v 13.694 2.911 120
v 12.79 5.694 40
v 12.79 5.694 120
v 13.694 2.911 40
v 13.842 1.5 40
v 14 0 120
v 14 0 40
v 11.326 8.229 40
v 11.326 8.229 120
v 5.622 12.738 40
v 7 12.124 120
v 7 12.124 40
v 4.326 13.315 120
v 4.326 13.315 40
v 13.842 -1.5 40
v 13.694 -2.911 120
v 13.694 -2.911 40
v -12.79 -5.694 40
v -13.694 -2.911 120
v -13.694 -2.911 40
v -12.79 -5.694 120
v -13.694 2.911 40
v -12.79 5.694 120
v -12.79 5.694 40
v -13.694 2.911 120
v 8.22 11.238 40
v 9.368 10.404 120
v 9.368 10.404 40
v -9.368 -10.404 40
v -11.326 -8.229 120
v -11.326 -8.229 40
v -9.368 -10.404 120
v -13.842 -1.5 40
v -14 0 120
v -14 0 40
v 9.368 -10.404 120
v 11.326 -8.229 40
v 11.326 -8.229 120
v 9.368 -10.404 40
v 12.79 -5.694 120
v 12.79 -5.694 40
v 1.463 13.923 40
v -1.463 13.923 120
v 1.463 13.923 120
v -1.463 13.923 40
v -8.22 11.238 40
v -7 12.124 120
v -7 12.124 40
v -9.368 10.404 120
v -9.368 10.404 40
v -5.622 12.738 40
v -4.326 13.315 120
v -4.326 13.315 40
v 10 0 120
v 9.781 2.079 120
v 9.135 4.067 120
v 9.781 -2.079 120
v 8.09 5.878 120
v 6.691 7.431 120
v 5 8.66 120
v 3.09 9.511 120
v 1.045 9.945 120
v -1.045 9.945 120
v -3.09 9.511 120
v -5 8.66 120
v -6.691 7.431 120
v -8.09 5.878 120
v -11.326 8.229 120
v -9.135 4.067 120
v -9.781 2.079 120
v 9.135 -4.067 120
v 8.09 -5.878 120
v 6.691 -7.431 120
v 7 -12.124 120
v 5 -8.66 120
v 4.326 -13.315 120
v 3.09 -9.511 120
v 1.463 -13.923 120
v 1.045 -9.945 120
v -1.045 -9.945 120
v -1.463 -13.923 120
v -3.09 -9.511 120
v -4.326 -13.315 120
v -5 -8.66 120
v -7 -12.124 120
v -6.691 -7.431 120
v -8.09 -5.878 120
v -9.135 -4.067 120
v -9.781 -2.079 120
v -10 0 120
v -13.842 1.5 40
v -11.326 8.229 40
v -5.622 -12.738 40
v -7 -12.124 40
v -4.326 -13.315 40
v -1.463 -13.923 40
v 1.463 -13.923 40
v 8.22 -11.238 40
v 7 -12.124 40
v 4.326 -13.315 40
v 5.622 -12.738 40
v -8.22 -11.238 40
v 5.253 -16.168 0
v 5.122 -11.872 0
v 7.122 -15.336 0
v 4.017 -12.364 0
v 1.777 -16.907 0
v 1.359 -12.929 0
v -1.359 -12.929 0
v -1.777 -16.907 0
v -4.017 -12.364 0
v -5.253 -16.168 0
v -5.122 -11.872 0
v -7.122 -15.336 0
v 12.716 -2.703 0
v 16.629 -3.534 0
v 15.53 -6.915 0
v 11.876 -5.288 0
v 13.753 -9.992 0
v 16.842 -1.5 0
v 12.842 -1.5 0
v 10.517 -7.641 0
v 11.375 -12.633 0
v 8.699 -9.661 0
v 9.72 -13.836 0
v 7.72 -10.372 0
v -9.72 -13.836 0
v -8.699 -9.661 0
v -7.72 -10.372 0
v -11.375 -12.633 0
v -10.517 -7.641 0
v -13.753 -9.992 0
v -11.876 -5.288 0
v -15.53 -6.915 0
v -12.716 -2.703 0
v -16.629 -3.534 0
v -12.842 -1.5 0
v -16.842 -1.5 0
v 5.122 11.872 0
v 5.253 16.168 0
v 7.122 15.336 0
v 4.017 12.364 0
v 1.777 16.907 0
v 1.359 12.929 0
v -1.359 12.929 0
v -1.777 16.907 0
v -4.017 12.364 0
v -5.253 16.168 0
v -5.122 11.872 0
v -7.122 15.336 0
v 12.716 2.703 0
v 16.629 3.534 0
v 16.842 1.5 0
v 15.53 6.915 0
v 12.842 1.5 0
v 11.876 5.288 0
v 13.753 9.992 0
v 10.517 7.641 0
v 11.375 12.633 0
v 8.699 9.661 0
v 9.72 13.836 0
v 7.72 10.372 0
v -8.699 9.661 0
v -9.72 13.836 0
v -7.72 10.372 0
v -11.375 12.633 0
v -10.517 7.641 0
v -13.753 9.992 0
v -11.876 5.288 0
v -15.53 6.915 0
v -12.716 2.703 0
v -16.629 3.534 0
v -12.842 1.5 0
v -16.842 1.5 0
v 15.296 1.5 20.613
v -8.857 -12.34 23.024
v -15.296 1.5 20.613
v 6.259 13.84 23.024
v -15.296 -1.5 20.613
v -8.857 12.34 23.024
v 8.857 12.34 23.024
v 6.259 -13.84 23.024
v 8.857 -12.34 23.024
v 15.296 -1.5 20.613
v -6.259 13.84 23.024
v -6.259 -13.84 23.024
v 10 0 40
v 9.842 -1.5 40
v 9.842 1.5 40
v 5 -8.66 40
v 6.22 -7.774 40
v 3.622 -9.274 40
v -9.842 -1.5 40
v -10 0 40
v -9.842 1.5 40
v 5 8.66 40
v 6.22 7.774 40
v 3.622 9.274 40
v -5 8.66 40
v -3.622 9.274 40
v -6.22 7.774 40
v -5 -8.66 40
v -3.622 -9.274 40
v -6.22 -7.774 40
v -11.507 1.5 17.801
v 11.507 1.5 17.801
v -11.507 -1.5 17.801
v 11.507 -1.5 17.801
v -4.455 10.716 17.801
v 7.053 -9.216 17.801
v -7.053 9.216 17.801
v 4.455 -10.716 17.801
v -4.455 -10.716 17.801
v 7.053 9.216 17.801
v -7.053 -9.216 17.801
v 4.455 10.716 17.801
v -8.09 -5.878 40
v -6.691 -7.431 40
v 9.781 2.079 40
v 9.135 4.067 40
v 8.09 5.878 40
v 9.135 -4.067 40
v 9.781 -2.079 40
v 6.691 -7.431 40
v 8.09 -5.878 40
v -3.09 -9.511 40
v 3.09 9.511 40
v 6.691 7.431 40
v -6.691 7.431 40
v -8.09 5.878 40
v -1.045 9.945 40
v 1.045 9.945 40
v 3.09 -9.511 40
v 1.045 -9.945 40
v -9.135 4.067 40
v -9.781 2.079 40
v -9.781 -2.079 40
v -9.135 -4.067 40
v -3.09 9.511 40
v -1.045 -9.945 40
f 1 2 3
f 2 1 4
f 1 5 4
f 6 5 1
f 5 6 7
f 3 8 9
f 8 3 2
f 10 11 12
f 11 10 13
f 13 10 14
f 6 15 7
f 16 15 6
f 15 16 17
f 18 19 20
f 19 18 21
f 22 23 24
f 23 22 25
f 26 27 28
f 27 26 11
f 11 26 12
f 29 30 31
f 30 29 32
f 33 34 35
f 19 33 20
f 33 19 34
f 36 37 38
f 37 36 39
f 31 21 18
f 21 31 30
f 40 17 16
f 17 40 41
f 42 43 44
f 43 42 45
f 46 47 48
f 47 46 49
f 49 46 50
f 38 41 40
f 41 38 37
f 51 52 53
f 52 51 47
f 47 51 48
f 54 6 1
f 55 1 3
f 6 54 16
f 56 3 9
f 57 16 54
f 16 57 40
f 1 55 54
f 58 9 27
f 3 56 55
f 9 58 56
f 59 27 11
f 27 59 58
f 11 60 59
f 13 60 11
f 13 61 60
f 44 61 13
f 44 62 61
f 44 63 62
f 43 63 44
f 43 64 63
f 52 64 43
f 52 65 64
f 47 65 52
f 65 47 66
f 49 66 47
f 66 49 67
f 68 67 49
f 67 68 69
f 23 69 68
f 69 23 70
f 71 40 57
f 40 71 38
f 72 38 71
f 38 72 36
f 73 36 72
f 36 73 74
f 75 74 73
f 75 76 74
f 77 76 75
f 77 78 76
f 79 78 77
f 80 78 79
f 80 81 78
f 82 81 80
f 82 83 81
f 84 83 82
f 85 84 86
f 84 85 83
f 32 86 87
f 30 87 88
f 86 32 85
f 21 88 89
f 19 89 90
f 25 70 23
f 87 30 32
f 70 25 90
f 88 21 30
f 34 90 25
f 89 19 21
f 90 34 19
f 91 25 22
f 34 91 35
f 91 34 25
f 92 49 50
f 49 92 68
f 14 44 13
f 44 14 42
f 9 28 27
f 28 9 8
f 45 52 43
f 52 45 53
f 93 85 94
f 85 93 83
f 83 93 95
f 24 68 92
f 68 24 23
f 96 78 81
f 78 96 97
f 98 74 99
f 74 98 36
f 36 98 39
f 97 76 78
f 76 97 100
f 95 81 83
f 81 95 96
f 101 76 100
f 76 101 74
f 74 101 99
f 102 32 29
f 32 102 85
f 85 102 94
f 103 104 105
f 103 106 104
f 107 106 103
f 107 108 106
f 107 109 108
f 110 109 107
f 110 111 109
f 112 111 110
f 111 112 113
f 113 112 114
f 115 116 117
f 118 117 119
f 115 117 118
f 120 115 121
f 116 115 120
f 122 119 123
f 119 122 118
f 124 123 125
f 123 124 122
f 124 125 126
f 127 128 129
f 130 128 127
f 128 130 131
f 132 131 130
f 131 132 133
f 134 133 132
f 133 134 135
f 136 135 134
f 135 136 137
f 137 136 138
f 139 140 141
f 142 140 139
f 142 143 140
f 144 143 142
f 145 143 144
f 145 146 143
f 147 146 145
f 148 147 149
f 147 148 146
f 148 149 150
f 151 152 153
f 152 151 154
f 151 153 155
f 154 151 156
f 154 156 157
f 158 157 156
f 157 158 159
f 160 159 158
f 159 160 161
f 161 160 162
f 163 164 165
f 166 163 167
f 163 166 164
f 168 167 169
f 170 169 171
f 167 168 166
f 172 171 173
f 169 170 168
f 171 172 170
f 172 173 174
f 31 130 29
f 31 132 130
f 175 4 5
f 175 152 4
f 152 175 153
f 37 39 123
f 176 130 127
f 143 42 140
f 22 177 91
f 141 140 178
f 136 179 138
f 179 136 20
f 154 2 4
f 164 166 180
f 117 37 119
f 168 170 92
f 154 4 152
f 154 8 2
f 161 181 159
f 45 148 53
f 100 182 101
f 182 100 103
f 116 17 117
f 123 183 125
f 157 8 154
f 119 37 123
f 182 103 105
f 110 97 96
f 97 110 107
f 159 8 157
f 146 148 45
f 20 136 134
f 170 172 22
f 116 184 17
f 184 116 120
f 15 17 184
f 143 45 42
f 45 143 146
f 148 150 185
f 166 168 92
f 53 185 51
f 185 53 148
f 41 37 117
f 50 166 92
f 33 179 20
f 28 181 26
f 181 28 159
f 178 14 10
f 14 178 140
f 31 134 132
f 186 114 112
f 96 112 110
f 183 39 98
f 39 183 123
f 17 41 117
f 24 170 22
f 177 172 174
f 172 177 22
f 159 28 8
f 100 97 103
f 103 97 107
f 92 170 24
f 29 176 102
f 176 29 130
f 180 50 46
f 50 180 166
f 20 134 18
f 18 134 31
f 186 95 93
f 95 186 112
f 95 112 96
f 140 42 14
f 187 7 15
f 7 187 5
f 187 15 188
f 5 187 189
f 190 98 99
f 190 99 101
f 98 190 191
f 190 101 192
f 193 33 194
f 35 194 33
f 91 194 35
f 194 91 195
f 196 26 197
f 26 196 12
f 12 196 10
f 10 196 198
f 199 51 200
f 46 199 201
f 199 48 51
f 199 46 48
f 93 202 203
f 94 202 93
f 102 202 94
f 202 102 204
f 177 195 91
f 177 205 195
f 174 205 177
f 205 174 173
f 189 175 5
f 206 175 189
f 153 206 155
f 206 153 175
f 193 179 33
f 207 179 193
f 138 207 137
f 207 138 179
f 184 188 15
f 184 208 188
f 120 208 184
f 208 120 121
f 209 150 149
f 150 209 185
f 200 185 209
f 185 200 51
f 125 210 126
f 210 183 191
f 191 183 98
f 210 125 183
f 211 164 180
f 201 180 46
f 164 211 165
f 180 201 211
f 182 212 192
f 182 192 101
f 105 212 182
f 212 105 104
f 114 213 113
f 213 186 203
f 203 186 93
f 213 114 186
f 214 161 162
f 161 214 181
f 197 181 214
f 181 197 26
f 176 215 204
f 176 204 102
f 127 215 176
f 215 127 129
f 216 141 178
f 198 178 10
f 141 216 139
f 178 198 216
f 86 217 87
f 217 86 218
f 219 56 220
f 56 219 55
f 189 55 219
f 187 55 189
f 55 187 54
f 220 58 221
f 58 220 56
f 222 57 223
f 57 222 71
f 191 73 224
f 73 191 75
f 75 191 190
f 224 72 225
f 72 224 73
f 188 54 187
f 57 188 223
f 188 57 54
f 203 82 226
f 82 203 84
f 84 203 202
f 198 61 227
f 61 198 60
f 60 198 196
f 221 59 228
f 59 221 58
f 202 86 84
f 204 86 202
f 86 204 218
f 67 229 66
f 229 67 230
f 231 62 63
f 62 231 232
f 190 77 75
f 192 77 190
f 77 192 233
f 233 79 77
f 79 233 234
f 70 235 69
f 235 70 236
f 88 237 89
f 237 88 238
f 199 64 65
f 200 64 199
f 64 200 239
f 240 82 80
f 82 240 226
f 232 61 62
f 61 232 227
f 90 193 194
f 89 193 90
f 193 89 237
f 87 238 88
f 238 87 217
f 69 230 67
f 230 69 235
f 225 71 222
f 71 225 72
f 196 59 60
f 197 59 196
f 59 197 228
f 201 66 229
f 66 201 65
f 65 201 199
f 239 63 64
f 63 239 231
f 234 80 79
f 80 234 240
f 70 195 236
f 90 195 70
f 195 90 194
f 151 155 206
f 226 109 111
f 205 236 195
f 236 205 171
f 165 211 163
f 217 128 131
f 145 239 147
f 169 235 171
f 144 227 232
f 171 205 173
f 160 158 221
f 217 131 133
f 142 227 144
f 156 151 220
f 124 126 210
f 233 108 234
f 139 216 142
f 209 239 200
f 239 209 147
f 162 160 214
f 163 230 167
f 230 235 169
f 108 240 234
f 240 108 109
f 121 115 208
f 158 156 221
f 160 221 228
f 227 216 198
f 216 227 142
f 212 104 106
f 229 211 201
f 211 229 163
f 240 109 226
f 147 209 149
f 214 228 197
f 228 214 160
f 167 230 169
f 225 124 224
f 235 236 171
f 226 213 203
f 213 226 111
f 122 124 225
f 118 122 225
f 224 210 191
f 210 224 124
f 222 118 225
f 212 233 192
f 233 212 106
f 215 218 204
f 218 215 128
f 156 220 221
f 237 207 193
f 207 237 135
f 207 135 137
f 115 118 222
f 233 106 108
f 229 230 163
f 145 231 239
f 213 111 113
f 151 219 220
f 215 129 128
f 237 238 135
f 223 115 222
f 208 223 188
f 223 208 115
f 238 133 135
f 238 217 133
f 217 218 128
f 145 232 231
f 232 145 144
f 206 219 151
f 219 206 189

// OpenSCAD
thickness=8;
spacing=3;
minDiam=28;
maxDiam=34;
totalHeight=120;
coneHeight=40;

difference() {
    union() {
        translate([0, 0, totalHeight/2]) cylinder(h=totalHeight, d=minDiam, center=true);
        translate([0, 0, coneHeight/2]) cylinder(h=coneHeight, d1=maxDiam, d2=minDiam, center=true);
    }
    translate([0, 0, totalHeight/2]) cylinder(h=totalHeight, d=minDiam-thickness, center=true);         
    translate([0, 0, coneHeight/2]) cylinder(h=coneHeight, d1=maxDiam-thickness, d2=minDiam-thickness, center=true);     
    for(a = [0:360/3:359]){
        translate([0, 0, coneHeight/2]) rotate([0, 0, a]) cube([maxDiam, spacing, coneHeight], center=true);
    }
}
